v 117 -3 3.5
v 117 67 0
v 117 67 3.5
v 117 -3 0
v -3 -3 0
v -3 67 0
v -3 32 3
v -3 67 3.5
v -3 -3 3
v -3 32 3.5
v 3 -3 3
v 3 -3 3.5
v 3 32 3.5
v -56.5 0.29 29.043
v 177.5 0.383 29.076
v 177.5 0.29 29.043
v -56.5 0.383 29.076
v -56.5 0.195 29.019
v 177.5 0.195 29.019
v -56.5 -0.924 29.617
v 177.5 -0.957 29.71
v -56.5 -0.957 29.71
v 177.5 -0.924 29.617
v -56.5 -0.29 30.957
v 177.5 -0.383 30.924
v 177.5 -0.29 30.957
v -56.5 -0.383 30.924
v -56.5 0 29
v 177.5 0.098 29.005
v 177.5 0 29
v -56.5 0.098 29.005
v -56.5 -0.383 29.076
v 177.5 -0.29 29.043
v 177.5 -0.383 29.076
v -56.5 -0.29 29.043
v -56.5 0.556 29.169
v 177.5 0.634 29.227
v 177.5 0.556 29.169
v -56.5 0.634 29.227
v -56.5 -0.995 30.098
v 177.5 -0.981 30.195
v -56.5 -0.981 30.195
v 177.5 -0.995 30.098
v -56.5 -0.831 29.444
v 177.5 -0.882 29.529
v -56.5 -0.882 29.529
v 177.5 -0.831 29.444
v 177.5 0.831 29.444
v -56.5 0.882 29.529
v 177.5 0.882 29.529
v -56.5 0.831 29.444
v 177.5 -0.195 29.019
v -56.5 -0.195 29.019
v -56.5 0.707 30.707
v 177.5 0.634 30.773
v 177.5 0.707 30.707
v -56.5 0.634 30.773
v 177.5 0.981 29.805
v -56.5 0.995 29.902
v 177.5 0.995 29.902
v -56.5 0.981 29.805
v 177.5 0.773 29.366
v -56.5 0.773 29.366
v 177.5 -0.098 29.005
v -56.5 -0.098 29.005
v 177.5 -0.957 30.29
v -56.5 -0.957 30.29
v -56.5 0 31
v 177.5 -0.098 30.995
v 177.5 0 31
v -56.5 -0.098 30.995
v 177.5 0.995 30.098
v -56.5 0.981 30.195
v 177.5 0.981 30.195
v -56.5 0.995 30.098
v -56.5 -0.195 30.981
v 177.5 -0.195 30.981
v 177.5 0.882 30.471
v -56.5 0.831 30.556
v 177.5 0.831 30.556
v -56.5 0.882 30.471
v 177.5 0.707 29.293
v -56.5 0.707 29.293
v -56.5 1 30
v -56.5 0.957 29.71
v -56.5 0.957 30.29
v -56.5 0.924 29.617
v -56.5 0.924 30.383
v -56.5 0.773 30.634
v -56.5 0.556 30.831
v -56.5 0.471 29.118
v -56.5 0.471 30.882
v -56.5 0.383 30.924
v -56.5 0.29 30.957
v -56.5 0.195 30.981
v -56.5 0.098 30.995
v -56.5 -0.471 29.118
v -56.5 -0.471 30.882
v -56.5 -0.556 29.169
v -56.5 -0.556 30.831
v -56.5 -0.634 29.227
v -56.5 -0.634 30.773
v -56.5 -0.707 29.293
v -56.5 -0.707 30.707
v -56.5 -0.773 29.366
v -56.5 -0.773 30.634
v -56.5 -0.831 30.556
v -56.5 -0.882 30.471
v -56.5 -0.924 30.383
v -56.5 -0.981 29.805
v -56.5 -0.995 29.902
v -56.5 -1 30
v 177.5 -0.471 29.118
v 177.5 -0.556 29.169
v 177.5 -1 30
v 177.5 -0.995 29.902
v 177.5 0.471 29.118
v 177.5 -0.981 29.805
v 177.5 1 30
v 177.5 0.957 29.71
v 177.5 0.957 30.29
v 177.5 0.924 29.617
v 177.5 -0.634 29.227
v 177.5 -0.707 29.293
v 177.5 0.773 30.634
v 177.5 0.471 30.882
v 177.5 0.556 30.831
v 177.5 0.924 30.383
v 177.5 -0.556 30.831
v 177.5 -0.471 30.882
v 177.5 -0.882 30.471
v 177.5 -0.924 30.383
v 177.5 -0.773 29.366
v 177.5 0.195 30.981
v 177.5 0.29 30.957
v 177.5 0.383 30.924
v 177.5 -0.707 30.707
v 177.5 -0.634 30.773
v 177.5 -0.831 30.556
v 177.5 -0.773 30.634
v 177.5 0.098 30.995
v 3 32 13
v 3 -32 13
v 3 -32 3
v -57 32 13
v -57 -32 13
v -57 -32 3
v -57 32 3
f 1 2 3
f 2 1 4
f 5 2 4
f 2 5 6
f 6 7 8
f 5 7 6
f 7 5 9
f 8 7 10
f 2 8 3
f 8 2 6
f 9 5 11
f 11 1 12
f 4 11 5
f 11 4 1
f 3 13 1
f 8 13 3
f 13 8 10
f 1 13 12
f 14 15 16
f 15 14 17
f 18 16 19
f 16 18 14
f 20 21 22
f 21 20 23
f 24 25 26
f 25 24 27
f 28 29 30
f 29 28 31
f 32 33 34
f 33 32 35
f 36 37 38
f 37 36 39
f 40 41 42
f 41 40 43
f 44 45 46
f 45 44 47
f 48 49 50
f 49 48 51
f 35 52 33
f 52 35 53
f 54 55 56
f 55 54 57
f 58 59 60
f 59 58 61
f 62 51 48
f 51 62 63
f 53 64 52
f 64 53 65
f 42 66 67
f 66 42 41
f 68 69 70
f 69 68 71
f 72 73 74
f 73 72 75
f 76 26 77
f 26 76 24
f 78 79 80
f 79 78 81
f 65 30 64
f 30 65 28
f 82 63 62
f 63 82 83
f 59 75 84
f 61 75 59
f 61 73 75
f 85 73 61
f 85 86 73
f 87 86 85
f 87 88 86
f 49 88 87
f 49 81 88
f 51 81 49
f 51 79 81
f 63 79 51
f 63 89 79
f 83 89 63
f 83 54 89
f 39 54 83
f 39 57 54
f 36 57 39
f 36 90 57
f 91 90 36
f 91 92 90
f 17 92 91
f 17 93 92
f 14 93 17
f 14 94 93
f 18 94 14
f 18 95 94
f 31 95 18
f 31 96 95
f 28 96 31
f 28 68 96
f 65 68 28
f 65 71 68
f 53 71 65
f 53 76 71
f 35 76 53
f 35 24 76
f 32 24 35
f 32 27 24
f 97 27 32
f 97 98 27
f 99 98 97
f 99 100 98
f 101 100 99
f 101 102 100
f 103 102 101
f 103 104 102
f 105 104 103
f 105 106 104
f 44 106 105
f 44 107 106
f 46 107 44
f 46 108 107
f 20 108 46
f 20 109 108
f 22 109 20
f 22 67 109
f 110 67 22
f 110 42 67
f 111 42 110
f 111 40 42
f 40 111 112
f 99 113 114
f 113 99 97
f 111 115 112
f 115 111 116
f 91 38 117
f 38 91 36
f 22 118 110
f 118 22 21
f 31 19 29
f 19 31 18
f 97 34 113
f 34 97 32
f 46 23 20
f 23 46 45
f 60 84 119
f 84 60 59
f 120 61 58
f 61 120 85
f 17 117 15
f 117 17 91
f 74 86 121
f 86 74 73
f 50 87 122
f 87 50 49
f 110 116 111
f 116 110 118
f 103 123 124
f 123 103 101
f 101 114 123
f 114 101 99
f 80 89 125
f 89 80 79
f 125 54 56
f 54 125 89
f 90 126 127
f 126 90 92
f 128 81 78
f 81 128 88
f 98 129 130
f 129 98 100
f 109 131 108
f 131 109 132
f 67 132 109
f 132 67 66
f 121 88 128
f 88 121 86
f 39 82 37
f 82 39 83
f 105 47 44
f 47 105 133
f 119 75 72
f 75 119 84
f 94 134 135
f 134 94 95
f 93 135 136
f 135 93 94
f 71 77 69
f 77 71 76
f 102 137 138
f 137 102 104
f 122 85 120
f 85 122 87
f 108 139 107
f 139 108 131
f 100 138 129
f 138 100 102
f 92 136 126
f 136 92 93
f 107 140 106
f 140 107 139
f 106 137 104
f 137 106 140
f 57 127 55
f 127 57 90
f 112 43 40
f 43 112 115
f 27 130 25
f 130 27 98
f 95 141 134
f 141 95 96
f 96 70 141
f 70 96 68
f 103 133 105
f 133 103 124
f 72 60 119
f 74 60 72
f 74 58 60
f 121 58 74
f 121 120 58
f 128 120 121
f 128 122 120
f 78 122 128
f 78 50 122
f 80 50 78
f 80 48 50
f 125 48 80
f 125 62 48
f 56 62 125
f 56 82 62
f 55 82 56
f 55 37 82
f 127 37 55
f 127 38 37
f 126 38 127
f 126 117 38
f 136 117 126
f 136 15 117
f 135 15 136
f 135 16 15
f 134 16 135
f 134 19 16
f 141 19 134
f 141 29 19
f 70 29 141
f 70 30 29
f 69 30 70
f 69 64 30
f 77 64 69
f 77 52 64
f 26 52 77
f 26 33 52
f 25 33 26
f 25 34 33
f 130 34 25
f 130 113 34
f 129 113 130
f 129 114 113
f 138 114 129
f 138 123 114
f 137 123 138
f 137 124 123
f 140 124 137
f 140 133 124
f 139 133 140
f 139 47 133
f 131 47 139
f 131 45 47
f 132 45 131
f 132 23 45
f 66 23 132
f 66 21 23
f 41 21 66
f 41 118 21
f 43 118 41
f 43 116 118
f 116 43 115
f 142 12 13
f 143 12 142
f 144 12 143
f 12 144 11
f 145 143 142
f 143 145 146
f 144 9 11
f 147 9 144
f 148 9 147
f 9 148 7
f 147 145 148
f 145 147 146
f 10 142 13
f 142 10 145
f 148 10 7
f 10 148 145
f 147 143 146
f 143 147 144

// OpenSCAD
// Mini horizontal gel-electrophoresis buffer tank
// Print orientation: base on XY plane, open top facing +Z

$fn = 64;

// ---- Tank dimensions ----
tank_x = 120;   // outer length in X
tank_y = 70;    // outer width in Y
tank_z = 40;    // outer height in Z
wall   = 3;     // wall thickness
floor  = 3;     // floor thickness

// ---- Platform dimensions ----
plat_len   = 60;   // platform length in X
plat_top_z = 13;   // platform top height (floor is at z = 3)

// ---- Electrode holes ----
hole_d = 2;    // hole diameter
hole_y = 0;    // hole Y position
hole_z = 30;   // hole Z position

// ---- Derived ----
inner_x = tank_x - 2 * wall;
inner_y = tank_y - 2 * wall;
inner_floor_z = floor;
eps = 0.5;     // cutter overshoot

module tank_body() {
    difference() {
        translate([-wall, -wall, 0])
            cube([tank_x, tank_y, tank_z]);
        // open top: remove everything above inner floor + eps
        translate([-wall, -wall, inner_floor_z + eps])
            cube([tank_x, tank_y, tank_z - inner_floor_z - eps + 0.01]);
    }
}

module platform() {
    // solid block from inner floor up to plat_top_z, centred in X, full Y
    translate([-inner_x / 2, -inner_y / 2, inner_floor_z])
        cube([plat_len, inner_y, plat_top_z - inner_floor_z]);
}

module electrode_holes() {
    for (sx = [-1, 1])
        translate([sx * (inner_x / 2 - eps), hole_y, hole_z])
            rotate([0, 90, 0])
                cylinder(d = hole_d, h = tank_x + 2 * eps);
}

union() {
    tank_body();
    platform();
    electrode_holes();
}
